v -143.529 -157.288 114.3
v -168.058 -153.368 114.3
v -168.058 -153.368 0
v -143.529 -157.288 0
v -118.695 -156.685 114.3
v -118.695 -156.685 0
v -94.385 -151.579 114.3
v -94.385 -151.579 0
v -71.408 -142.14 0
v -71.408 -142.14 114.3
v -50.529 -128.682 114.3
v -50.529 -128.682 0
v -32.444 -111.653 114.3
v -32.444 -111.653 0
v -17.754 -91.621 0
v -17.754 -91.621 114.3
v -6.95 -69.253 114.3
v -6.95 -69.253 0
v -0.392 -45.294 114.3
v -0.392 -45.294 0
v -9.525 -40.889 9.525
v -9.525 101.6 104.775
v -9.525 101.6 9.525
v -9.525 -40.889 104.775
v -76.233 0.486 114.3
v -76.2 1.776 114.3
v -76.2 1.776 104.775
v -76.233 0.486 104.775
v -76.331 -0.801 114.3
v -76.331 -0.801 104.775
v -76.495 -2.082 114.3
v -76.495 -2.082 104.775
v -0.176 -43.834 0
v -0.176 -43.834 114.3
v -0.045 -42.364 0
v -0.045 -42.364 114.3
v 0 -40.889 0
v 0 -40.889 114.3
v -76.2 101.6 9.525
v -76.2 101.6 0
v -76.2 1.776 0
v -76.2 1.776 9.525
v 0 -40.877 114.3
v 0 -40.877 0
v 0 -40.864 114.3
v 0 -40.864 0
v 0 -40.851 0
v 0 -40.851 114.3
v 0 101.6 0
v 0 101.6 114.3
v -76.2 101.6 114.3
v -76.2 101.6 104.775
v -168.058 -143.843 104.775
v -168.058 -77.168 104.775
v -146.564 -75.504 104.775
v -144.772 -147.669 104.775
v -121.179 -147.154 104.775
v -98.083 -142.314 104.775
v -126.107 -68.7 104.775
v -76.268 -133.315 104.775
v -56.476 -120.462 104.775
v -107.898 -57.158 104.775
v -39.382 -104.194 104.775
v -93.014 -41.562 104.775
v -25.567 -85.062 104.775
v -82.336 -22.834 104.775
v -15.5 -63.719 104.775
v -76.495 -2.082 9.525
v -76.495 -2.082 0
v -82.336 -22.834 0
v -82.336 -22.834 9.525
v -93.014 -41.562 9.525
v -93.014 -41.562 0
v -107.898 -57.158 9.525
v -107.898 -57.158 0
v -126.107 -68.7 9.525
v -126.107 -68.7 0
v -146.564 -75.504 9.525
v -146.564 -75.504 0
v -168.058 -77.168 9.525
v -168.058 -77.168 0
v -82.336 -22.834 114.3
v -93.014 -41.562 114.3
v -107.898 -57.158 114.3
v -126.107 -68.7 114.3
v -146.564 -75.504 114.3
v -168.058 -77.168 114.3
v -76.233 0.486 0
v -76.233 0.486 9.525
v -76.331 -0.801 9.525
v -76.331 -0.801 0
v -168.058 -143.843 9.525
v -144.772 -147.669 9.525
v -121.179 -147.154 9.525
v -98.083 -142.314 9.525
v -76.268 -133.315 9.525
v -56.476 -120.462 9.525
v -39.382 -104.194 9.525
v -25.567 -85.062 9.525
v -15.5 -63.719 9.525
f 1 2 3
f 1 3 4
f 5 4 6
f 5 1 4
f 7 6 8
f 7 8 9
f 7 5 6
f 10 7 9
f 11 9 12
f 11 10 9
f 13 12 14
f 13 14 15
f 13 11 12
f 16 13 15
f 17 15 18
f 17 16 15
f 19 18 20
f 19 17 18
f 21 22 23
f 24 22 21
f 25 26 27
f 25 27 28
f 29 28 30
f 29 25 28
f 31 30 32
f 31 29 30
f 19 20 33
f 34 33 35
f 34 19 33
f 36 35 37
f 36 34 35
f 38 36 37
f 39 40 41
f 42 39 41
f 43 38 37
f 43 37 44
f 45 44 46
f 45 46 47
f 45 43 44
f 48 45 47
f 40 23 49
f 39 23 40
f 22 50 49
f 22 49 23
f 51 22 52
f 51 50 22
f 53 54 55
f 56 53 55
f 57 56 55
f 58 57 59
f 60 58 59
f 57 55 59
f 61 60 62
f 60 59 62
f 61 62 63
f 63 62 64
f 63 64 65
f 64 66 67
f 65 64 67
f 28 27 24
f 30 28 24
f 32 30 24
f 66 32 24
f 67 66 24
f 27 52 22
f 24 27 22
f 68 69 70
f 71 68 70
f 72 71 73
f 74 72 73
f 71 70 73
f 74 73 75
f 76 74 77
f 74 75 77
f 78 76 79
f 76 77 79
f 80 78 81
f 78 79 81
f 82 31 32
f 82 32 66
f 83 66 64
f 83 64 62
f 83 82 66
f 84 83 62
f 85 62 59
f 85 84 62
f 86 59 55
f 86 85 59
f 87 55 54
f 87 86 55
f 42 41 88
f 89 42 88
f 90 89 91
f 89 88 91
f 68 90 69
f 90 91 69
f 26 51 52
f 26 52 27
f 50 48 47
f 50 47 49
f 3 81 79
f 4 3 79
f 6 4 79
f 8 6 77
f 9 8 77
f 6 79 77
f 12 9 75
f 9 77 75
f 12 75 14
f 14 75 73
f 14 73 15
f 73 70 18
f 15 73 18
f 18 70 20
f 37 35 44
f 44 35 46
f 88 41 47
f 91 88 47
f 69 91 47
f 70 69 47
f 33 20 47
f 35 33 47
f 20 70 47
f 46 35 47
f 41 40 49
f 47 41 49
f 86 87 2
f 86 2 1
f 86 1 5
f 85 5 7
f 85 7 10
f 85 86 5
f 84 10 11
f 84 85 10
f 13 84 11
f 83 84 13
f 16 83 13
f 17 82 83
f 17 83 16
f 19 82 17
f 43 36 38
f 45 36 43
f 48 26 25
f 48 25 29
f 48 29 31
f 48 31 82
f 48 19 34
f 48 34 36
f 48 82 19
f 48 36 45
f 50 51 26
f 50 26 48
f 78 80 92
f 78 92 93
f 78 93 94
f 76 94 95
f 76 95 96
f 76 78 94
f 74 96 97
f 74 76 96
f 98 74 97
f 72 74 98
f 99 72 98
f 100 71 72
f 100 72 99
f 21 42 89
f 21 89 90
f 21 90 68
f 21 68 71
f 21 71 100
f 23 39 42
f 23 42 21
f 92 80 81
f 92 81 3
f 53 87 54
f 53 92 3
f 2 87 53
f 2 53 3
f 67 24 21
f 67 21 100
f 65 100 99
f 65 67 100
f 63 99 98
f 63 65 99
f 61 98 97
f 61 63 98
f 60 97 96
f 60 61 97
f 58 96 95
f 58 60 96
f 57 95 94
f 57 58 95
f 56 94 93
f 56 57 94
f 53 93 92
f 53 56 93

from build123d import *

# Parameters (mm, degrees)
F1_DEPTH = 9.525
F2_DEPTH = 57.15


# Not quite as in the source:
# - ends of sketch curves that miss each other by under 0.0002 mm in the source are joined


with BuildPart() as f1:
    # F0 (on Top) → F1 (new body)
    with BuildSketch(Plane.XY):
        with BuildLine():
            Line((-9.525, -40.8894196153), (-9.525, 101.6))
            Line((-9.525, 101.6), (-76.2, 101.6))
            Line((-76.2, 101.6), (-76.2, 1.7757813176))
            ThreePointArc((-76.2, 1.7757813176), (-76.2737613091, -0.1585489984), (-76.4946168324, -2.0816447683))
            ThreePointArc((-76.4946168324, -2.0816447683), (-107.8980822653, -57.1580249287), (-168.0578880185, -77.1675992495))
            Line((-168.0578880185, -77.1675992495), (-168.0578880185, -143.8425992495))
            ThreePointArc((-168.0578880185, -143.8425992495), (-66.0749732172, -127.3460628222), (-9.525, -40.8894196153))
        make_face()
    extrude(amount=F1_DEPTH)

    # F0 (on Top) → F2 (join)
    with BuildSketch(Plane.XY):
        with BuildLine():
            ThreePointArc((-2.87076e-05, -40.8894195721), (-7.1769e-06, -40.8703254289), (0, -40.8512312749))
            Line((0, -40.8512312749), (0, 101.6))
            Line((0, 101.6), (-9.525, 101.6))
            Line((-9.525, 101.6), (-9.525, -40.8894196153))
            Line((-9.525, -40.8894196153), (-2.87076e-05, -40.8894195721))
        make_face()
        with BuildLine():
            ThreePointArc((-0.3915773599, -45.2940678749), (-0.0997672663, -43.1002807673), (-2.87076e-05, -40.8894195721))
            Line((-2.87076e-05, -40.8894195721), (-9.525, -40.8894196153))
            ThreePointArc((-9.525, -40.8894196153), (-66.0749732172, -127.3460628222), (-168.0578880185, -143.8425992495))
            Line((-168.0578880185, -143.8425992495), (-168.0578880185, -153.3675992495))
            ThreePointArc((-168.0578880185, -153.3675992495), (-60.6607327041, -135.8882486075), (-0.3915773599, -45.2940678749))
        make_face()
    extrude(amount=F2_DEPTH)

    # F3: F1 across face


with BuildPart() as f1_1:
    add(f1.part)
    add(f1.part.mirror(Plane(origin=(-44.7738585302, -61.3523725629, 57.15), x_dir=(1, 0, 0), z_dir=(0, 0, 1))))


solid = f1_1.part
